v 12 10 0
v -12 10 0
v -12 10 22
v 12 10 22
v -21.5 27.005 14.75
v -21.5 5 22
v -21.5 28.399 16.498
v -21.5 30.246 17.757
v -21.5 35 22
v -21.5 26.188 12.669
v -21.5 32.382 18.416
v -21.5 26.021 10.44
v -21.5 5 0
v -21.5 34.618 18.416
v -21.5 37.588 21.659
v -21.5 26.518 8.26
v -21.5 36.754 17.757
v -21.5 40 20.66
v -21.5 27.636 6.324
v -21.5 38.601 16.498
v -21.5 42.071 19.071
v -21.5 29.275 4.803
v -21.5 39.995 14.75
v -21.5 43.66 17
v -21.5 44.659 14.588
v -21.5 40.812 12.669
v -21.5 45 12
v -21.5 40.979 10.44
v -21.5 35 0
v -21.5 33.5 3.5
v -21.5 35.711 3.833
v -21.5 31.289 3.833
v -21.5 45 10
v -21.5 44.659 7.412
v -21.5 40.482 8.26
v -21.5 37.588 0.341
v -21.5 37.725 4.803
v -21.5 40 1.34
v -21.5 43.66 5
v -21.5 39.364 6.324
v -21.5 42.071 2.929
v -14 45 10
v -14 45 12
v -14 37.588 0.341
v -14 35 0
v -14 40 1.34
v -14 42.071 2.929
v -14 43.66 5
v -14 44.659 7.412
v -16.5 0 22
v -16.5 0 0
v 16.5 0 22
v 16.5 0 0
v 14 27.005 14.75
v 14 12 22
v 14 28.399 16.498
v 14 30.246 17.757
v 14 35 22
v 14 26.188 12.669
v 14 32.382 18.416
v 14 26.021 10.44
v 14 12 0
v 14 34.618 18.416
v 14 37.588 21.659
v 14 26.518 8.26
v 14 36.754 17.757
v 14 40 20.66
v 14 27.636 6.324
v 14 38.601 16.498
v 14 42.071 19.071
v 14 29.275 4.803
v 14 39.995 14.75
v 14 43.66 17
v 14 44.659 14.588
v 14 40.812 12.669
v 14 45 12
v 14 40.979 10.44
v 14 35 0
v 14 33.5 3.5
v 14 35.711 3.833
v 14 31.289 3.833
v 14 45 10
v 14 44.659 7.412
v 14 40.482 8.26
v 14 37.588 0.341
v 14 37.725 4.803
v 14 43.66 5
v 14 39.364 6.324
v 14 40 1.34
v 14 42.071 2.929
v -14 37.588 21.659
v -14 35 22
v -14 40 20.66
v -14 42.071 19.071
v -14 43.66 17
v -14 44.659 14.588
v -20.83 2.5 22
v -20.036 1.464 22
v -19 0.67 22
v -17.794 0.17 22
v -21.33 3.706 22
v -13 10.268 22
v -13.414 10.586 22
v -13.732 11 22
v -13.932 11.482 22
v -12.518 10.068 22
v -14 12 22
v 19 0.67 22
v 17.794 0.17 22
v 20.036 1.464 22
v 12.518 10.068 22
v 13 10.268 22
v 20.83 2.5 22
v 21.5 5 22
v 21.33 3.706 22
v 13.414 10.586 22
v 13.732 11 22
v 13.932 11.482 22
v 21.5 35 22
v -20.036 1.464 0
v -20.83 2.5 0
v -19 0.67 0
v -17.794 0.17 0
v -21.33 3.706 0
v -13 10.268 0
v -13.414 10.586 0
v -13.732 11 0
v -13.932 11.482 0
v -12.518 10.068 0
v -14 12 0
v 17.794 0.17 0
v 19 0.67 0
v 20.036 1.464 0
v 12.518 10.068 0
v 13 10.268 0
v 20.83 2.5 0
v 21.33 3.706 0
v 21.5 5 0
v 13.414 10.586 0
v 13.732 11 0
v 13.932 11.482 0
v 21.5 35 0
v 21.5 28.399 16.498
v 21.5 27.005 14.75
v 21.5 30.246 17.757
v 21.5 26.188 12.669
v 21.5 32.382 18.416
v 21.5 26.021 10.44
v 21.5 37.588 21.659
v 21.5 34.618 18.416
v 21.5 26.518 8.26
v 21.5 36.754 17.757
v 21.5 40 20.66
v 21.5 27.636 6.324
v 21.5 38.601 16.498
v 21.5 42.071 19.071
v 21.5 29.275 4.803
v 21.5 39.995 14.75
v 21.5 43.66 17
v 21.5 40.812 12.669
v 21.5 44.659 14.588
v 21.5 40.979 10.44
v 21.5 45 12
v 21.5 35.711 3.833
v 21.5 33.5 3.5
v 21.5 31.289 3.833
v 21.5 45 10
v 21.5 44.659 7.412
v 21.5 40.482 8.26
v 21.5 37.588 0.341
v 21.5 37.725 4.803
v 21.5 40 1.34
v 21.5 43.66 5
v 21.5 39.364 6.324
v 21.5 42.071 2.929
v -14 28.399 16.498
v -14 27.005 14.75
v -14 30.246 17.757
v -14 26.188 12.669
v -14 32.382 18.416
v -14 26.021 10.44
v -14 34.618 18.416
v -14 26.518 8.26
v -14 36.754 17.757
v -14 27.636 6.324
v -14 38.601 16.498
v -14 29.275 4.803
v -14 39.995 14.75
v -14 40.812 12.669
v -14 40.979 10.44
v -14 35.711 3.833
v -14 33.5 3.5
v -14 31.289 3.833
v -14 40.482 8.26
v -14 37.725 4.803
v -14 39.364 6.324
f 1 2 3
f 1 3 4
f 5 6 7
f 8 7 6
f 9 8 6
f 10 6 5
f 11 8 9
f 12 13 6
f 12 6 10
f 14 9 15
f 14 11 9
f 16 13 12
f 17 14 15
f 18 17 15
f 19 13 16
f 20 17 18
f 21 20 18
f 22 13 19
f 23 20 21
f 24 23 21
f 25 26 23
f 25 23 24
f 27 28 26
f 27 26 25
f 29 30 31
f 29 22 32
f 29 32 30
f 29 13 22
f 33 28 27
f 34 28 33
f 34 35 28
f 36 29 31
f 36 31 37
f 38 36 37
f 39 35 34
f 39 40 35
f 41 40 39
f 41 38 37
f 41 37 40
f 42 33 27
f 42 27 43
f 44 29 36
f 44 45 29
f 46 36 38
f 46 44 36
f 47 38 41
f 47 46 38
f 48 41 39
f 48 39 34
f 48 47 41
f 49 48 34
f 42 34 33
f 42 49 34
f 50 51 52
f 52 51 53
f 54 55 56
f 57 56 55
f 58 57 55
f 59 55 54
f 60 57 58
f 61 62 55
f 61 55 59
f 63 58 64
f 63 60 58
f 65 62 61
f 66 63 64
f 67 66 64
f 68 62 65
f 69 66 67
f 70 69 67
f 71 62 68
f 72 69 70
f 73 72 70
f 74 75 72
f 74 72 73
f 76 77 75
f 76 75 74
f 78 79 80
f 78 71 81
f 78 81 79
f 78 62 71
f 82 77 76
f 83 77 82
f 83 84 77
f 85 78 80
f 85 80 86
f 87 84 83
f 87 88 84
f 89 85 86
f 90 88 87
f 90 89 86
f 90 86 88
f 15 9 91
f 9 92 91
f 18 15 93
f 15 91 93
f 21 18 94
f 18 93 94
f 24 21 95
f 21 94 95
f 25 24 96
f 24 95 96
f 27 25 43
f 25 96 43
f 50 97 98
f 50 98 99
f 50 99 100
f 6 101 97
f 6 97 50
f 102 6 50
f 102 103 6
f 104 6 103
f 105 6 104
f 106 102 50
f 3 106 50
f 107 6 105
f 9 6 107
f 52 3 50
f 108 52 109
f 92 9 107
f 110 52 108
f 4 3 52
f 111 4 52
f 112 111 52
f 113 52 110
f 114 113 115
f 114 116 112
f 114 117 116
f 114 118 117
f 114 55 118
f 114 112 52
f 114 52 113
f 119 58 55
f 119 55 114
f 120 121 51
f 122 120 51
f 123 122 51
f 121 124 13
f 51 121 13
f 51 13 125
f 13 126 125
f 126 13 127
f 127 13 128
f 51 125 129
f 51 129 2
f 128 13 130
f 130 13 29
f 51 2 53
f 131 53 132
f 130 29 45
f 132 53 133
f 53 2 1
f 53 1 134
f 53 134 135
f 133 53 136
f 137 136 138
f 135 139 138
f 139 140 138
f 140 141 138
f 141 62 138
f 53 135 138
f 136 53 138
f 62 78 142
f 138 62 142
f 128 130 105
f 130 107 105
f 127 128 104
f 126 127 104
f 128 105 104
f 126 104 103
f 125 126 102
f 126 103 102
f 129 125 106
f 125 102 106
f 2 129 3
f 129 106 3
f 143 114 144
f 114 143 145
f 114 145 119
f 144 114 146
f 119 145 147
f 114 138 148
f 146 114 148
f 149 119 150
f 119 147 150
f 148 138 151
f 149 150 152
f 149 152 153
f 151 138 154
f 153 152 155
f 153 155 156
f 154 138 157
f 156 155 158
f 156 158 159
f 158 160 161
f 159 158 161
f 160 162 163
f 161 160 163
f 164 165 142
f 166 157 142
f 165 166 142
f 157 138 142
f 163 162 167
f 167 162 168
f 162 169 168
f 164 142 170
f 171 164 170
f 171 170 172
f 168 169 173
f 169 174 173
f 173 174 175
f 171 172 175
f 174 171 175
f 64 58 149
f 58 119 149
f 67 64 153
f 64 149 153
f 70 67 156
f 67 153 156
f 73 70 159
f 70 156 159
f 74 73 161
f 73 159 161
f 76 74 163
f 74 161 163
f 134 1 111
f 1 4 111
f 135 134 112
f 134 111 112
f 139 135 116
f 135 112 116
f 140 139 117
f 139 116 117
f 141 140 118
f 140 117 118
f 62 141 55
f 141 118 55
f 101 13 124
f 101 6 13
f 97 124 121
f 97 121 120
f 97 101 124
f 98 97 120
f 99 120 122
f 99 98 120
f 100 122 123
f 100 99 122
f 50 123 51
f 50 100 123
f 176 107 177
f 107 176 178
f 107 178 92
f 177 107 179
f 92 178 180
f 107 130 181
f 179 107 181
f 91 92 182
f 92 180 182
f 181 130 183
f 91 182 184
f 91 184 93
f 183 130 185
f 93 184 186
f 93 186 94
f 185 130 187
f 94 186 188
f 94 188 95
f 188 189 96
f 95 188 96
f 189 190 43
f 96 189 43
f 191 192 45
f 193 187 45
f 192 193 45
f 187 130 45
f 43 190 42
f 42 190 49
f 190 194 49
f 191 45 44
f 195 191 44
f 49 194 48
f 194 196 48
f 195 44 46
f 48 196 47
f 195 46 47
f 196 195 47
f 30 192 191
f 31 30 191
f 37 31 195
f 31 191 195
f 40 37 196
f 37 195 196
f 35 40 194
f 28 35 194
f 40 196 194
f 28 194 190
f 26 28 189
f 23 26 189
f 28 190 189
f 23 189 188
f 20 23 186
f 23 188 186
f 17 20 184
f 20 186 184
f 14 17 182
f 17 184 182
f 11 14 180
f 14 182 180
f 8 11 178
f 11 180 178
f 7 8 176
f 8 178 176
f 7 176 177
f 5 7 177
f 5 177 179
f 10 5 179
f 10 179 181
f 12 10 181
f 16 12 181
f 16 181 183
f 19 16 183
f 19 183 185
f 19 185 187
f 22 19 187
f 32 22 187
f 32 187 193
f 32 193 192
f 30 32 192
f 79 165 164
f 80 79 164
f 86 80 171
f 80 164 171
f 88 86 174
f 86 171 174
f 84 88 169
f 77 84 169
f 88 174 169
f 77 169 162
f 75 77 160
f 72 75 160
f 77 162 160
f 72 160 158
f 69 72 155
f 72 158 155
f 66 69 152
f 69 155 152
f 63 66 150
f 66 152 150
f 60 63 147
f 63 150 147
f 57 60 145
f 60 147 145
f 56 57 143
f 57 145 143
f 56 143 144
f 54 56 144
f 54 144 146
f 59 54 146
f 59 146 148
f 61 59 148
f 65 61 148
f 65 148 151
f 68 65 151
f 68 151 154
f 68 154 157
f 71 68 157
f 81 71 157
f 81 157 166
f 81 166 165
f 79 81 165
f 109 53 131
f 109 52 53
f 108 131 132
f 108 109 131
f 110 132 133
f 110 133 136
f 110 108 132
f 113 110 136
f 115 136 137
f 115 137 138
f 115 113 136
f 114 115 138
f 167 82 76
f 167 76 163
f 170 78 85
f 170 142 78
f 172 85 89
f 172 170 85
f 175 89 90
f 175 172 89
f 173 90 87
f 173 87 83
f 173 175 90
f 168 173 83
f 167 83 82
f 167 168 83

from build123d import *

# Parameters (mm, degrees)
SZKIC1_W                    = 43
SZKIC1_H                    = 45
DODANIE_WYCI_GNI_CIE1_DEPTH = 22
SZKIC3_W                    = 28
SZKIC3_H                    = 35
WYTNIJ_WYCI_GNI_CIE1_DEPTH  = 63
SZKIC4_R                    = 7.5
WYTNIJ_WYCI_GNI_CIE2_DEPTH  = 63
ZAOKR_GLENIE1_R             = 10
ZAOKR_GLENIE2_R             = 2
ZAOKR_GLENIE3_R             = 5


with BuildPart() as part:
    # Szkic1 → Dodanie-wyciągnięcie1 (new body)
    with BuildSketch(Plane.XY):
        with Locations((0, 22.5)):
            Rectangle(SZKIC1_W, SZKIC1_H)
    extrude(amount=DODANIE_WYCI_GNI_CIE1_DEPTH)

    # Szkic3 → Wytnij-wyciągnięcie1 (cut)
    with BuildSketch(Plane.XY):
        with Locations((0, 27.5)):
            Rectangle(SZKIC3_W, SZKIC3_H)
    extrude(amount=WYTNIJ_WYCI_GNI_CIE1_DEPTH, mode=Mode.SUBTRACT)

    # Szkic4 → Wytnij-wyciągnięcie2 (cut)
    with BuildSketch(Plane(origin=(21.5, 0, 0), x_dir=(0, 0, -1), z_dir=(1, 0, 0))):
        with Locations((-11, 33.5)):
            Circle(SZKIC4_R)
    extrude(amount=-WYTNIJ_WYCI_GNI_CIE2_DEPTH, mode=Mode.SUBTRACT)

    # Zaokrąglenie1
    zaokr_glenie1_edges = [part.edges().sort_by_distance(p)[0] for p in [
        (-17.75, 45, 0),
        (-17.75, 45, 22),
        (17.75, 45, 22),
        (17.75, 45, 0),
    ]]
    fillet(zaokr_glenie1_edges, radius=ZAOKR_GLENIE1_R)

    # Zaokrąglenie2
    zaokr_glenie2_edges = [part.edges().sort_by_distance(p)[0] for p in [
        (14, 10, 11),
        (-14, 10, 11),
    ]]
    fillet(zaokr_glenie2_edges, radius=ZAOKR_GLENIE2_R)

    # Zaokrąglenie3
    zaokr_glenie3_edges = [part.edges().sort_by_distance(p)[0] for p in [
        (21.5, 0, 11),
        (-21.5, 0, 11),
    ]]
    fillet(zaokr_glenie3_edges, radius=ZAOKR_GLENIE3_R)


solid = part.part
